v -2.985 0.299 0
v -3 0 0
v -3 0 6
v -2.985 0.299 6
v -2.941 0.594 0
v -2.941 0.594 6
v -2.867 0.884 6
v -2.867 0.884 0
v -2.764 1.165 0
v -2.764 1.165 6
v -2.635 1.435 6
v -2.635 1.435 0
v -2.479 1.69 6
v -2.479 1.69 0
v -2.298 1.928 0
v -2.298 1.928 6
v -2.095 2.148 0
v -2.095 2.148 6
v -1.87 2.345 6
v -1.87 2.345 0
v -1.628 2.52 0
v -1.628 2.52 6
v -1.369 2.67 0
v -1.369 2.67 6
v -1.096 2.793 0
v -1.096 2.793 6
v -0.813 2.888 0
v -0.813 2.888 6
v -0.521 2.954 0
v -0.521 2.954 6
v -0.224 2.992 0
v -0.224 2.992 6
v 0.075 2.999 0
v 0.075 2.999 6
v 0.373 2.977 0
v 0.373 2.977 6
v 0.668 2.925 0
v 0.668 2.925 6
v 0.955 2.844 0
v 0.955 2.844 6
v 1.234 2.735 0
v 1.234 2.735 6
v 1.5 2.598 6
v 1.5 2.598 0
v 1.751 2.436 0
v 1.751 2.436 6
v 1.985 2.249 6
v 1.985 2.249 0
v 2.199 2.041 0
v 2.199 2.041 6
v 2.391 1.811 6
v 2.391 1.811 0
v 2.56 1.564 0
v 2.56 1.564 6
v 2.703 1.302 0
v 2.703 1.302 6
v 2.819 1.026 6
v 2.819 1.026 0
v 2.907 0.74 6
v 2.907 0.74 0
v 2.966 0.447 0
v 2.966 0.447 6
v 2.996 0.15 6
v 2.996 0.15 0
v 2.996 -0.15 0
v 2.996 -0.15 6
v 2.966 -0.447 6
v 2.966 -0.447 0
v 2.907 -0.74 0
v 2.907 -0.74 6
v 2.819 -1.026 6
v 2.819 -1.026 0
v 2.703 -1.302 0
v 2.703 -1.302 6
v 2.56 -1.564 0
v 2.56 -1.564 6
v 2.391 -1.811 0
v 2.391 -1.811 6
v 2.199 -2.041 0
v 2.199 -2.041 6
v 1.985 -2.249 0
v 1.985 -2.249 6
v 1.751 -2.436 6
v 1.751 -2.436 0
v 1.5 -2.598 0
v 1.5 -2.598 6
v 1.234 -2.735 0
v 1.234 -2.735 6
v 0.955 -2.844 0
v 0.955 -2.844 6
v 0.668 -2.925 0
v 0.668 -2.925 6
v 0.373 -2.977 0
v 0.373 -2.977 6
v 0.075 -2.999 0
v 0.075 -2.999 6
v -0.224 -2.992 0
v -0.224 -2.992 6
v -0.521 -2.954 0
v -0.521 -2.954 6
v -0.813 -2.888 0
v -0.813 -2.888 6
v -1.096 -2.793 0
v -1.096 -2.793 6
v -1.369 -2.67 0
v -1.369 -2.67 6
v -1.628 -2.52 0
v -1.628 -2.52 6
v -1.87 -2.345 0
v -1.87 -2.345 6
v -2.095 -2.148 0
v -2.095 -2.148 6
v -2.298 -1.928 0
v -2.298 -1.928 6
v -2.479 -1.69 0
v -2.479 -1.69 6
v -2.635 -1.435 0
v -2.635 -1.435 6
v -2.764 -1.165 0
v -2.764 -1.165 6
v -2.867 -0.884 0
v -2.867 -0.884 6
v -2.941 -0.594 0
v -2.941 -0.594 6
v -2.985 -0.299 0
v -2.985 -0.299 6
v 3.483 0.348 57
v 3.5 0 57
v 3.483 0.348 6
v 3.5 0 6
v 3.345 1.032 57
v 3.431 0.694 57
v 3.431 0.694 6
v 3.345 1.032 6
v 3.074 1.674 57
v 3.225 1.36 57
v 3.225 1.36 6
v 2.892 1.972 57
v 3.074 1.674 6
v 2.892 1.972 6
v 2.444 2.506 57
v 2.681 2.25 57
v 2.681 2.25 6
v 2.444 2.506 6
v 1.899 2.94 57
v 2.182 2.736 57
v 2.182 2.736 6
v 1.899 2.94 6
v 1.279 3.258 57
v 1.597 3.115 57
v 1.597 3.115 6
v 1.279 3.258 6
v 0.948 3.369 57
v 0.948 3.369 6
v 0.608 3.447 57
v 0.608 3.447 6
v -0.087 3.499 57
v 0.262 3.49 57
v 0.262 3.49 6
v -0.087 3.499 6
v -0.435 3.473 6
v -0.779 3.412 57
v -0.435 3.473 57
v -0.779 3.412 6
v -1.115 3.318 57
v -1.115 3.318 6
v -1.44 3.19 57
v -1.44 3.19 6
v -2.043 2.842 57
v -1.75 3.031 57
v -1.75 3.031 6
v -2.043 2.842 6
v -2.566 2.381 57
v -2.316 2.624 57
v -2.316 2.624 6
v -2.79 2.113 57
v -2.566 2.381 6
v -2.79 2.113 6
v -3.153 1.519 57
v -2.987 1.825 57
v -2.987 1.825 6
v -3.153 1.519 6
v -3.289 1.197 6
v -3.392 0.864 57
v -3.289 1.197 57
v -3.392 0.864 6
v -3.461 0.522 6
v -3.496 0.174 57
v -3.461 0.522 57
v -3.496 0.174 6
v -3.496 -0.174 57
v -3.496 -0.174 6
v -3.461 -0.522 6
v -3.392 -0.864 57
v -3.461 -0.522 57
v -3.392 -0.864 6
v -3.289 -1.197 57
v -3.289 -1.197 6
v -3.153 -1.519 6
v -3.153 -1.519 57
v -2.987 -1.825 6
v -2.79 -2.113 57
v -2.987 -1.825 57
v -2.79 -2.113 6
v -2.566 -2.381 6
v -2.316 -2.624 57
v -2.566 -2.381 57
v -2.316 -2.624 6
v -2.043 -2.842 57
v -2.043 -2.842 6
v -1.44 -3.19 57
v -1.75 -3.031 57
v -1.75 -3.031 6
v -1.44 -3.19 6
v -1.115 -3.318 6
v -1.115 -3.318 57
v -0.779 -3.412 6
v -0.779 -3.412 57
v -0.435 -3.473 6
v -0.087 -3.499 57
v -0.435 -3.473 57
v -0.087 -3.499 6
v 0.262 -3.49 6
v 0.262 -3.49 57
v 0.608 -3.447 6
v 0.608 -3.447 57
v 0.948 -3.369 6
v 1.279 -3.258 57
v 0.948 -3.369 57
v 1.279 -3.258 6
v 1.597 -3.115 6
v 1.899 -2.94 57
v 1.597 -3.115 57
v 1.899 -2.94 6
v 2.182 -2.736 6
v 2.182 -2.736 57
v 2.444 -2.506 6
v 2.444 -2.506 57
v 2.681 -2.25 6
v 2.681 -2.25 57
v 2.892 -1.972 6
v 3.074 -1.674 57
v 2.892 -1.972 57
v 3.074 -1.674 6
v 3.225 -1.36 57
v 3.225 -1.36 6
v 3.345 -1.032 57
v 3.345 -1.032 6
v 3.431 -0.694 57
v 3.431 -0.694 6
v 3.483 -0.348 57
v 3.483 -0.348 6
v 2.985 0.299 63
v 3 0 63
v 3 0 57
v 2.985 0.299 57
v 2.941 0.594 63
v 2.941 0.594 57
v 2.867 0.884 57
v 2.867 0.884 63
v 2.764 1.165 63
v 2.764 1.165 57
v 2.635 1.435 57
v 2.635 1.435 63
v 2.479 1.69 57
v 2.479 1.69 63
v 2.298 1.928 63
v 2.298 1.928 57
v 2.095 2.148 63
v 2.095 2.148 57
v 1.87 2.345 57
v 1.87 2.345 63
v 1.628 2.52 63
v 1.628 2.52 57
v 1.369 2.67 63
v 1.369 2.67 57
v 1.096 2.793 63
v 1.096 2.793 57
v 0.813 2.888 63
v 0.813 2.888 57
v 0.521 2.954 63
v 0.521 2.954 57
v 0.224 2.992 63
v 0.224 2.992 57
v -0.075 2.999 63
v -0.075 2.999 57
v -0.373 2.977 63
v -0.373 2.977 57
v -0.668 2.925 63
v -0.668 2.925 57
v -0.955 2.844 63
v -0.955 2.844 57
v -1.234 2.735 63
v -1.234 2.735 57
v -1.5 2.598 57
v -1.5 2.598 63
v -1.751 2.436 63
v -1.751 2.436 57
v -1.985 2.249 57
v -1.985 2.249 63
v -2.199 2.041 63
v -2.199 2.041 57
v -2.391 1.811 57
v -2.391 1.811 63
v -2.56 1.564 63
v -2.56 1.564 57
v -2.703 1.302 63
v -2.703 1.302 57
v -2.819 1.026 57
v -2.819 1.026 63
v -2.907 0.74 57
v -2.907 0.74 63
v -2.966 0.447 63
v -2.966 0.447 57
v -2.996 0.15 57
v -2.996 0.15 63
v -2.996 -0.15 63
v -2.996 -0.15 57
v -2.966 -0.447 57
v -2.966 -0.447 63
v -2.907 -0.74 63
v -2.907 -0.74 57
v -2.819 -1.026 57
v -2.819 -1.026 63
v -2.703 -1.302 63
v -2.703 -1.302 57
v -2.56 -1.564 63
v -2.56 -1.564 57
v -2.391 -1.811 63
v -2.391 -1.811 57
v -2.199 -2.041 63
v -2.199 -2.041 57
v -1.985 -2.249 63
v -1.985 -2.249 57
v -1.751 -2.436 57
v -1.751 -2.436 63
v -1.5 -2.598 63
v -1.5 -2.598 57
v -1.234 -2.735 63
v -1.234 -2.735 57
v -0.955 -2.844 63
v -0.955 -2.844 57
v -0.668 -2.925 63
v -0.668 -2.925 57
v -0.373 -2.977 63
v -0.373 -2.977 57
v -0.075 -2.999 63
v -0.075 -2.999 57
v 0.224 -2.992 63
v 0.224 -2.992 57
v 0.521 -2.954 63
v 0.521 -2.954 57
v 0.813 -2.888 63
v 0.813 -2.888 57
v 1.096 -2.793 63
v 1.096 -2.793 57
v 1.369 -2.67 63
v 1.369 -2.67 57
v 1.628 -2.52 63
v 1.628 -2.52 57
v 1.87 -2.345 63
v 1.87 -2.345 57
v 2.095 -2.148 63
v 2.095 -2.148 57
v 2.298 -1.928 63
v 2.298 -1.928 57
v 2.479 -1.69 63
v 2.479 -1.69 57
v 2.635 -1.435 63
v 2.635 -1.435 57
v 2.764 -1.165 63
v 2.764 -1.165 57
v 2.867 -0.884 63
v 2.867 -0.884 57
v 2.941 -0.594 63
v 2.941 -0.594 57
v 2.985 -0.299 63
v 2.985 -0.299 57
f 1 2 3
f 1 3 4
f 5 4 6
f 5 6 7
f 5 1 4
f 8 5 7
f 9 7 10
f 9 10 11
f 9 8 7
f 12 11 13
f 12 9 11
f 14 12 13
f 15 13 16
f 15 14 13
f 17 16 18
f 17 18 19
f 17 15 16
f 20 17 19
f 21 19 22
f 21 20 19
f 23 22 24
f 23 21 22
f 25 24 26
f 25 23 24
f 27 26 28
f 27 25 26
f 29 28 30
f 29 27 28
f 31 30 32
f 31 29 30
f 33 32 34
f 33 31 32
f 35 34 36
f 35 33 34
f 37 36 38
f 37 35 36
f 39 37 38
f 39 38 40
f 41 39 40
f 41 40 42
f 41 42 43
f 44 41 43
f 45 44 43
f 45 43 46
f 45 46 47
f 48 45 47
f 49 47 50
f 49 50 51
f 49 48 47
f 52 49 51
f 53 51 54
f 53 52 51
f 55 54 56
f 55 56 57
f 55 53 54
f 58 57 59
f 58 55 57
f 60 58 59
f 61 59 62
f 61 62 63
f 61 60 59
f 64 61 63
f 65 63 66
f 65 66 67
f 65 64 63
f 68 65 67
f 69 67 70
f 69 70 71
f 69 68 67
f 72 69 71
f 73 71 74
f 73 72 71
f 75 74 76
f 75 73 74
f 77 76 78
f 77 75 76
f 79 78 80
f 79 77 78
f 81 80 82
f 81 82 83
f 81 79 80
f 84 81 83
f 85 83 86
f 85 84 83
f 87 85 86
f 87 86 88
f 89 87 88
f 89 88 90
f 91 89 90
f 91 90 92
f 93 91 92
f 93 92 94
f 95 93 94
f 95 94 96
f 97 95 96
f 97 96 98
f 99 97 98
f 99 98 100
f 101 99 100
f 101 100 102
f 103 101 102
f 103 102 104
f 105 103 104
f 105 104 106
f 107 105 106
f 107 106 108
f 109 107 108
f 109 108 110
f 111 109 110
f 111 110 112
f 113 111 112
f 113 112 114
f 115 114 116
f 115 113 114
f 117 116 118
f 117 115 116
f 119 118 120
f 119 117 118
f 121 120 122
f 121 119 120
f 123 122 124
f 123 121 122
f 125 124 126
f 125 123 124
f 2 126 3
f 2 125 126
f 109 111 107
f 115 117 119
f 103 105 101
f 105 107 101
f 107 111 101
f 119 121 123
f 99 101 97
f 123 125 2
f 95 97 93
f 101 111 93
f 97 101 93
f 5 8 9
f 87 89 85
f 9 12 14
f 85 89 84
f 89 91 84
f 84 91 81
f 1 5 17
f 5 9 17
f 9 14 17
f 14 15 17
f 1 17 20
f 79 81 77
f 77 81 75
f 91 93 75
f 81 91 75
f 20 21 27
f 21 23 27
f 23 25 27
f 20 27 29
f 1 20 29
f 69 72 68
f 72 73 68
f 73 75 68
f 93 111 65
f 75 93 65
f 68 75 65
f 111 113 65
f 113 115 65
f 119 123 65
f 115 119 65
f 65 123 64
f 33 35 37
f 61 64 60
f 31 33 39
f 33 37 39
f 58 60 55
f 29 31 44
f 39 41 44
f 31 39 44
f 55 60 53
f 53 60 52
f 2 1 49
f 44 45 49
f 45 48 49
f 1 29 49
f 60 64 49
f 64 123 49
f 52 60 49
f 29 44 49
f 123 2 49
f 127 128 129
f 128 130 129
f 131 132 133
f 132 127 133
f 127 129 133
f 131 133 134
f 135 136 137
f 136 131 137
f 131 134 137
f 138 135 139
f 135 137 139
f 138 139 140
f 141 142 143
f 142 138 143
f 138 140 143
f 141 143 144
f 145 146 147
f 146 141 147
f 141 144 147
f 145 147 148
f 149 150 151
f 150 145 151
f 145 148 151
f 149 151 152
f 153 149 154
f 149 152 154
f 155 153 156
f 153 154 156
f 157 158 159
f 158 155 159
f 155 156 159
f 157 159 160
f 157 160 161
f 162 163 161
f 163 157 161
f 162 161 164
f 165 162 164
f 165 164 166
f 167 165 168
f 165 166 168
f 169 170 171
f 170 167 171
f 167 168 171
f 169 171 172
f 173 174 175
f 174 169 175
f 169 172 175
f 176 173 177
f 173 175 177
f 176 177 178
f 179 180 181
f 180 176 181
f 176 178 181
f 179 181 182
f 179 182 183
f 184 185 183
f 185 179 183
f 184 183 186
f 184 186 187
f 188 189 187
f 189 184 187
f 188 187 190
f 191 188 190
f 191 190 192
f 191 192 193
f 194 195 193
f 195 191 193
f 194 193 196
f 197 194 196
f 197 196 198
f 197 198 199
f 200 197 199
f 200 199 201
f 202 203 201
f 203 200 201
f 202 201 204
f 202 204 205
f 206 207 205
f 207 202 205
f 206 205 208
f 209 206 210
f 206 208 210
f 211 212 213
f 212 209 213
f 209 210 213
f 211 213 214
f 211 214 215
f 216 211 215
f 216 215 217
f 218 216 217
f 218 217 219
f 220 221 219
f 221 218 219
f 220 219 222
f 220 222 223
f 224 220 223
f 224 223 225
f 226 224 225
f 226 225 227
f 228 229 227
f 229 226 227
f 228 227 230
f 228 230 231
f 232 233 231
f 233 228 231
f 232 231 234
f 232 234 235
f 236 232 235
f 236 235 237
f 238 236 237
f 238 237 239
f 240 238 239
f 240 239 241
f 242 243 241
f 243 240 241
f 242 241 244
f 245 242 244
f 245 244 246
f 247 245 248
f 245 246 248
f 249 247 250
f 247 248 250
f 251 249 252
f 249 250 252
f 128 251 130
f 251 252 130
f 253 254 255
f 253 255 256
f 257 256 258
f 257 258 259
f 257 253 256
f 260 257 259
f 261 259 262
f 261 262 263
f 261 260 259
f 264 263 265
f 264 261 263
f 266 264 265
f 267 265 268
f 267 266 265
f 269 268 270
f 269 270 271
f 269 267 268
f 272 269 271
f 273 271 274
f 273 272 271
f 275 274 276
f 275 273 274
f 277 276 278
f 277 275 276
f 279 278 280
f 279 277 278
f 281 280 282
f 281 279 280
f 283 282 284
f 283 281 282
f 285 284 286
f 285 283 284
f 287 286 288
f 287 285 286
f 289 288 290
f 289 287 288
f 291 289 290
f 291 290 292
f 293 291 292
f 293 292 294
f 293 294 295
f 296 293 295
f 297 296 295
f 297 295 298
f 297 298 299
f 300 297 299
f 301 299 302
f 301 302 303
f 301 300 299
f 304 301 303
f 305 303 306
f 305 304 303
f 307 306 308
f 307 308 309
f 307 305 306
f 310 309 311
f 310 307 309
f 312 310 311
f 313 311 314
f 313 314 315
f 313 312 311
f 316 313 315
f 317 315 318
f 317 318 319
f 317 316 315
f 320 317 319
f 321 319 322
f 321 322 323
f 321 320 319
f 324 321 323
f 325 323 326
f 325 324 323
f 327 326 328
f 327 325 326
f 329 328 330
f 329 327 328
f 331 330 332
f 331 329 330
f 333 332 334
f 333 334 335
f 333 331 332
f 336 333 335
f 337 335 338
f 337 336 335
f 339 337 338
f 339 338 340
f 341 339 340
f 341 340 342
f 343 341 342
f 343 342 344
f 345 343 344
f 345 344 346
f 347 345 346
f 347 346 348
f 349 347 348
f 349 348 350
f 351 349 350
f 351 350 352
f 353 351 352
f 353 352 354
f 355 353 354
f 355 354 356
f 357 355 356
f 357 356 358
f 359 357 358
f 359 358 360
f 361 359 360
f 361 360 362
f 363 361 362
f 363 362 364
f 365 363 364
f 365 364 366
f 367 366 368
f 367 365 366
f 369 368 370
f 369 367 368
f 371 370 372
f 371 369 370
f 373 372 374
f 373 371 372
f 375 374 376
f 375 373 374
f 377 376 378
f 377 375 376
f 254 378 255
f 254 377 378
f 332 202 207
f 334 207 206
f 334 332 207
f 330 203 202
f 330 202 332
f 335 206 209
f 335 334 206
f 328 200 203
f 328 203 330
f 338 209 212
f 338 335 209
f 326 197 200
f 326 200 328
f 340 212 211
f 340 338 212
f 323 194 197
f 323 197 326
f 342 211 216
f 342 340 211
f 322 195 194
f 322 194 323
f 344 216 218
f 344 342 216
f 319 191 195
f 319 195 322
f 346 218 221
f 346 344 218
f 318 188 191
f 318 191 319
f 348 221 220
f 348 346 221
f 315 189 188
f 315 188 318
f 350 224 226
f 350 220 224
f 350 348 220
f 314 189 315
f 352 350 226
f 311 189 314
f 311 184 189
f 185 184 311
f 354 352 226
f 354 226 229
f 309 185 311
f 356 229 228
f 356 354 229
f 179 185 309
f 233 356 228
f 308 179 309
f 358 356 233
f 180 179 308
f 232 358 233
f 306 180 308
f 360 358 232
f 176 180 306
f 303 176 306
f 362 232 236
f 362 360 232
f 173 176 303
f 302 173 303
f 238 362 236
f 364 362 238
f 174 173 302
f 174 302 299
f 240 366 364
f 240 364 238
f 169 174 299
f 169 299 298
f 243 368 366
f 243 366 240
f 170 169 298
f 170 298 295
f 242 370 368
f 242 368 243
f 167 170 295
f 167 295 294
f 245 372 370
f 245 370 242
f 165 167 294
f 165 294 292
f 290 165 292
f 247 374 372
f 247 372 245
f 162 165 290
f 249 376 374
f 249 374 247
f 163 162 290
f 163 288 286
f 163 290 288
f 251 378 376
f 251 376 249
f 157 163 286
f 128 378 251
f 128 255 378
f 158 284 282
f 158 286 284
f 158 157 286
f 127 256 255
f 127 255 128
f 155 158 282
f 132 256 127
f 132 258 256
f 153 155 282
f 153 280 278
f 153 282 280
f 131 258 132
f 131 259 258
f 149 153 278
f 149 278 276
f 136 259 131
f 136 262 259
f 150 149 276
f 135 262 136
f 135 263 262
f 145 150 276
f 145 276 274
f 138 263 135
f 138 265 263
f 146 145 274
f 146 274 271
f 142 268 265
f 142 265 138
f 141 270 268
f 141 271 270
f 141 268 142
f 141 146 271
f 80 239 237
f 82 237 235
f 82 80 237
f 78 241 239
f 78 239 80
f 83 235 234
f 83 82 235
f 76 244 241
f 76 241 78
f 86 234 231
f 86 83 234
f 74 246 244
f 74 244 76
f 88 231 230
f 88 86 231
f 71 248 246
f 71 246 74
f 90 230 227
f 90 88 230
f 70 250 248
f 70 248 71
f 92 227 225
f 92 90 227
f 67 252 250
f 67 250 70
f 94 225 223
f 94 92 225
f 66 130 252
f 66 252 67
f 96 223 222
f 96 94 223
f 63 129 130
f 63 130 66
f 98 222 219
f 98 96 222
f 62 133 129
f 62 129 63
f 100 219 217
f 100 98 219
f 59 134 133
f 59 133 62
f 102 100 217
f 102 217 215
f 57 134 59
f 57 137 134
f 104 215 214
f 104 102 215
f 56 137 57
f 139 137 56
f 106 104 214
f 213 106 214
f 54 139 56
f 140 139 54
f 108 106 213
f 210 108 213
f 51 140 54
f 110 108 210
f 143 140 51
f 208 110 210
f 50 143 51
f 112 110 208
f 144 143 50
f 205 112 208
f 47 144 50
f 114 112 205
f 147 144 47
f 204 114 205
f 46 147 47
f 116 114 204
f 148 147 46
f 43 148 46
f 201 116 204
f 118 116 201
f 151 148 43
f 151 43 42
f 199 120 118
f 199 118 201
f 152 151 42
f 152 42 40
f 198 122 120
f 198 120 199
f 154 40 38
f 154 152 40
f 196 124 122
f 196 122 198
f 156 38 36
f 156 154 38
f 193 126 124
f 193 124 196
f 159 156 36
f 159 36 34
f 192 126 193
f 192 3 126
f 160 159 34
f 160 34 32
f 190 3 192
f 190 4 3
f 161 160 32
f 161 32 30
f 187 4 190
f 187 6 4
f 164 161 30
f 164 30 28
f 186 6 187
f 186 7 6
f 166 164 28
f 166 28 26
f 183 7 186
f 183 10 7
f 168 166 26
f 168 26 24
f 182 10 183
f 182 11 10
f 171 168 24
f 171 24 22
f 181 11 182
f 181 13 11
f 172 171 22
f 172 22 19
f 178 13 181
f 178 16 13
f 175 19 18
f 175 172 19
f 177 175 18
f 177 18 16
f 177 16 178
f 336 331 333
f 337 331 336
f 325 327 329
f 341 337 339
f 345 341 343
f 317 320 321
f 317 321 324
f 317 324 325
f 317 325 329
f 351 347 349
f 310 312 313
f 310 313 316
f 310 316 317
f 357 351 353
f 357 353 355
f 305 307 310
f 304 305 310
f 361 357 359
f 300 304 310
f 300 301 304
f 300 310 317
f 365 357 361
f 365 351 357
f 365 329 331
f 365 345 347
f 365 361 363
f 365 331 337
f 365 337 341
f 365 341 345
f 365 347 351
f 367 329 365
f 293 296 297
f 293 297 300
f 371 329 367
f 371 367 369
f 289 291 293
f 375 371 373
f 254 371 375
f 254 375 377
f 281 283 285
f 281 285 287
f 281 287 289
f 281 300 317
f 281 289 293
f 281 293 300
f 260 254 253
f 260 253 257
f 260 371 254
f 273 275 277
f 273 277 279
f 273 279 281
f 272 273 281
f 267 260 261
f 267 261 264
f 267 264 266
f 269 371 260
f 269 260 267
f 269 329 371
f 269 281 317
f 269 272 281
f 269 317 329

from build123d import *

# Parameters (mm, degrees)
SKETCH_1_R          = 3.5
EXTRUDE_1_DEPTH     = 63
SKETCH_2_R          = 5.249939155
SKETCH_2_R_2        = 3
CUT_EXTRUDE_1_DEPTH = 6
SKETCH_3_R          = 5.960650936
SKETCH_3_R_2        = 3
CUT_EXTRUDE_2_DEPTH = 6


with BuildPart() as part:
    # ｽｹｯﾁ1 → ﾎﾞｽ - 押し出し1 (new body)
    with BuildSketch(Plane.XY):
        Circle(SKETCH_1_R)
    extrude(amount=EXTRUDE_1_DEPTH)

    # ｽｹｯﾁ2 → ｶｯﾄ - 押し出し1 (cut)
    with BuildSketch(Plane.XY.offset(63)):
        Circle(SKETCH_2_R)
        Circle(SKETCH_2_R_2, mode=Mode.SUBTRACT)
    extrude(amount=-CUT_EXTRUDE_1_DEPTH, mode=Mode.SUBTRACT)

    # ｽｹｯﾁ3 → ｶｯﾄ - 押し出し2 (cut)
    with BuildSketch(Plane(origin=(0, 0, 0), x_dir=(-1, 0, 0), z_dir=(0, 0, -1))):
        Circle(SKETCH_3_R)
        Circle(SKETCH_3_R_2, mode=Mode.SUBTRACT)
    extrude(amount=-CUT_EXTRUDE_2_DEPTH, mode=Mode.SUBTRACT)


solid = part.part
